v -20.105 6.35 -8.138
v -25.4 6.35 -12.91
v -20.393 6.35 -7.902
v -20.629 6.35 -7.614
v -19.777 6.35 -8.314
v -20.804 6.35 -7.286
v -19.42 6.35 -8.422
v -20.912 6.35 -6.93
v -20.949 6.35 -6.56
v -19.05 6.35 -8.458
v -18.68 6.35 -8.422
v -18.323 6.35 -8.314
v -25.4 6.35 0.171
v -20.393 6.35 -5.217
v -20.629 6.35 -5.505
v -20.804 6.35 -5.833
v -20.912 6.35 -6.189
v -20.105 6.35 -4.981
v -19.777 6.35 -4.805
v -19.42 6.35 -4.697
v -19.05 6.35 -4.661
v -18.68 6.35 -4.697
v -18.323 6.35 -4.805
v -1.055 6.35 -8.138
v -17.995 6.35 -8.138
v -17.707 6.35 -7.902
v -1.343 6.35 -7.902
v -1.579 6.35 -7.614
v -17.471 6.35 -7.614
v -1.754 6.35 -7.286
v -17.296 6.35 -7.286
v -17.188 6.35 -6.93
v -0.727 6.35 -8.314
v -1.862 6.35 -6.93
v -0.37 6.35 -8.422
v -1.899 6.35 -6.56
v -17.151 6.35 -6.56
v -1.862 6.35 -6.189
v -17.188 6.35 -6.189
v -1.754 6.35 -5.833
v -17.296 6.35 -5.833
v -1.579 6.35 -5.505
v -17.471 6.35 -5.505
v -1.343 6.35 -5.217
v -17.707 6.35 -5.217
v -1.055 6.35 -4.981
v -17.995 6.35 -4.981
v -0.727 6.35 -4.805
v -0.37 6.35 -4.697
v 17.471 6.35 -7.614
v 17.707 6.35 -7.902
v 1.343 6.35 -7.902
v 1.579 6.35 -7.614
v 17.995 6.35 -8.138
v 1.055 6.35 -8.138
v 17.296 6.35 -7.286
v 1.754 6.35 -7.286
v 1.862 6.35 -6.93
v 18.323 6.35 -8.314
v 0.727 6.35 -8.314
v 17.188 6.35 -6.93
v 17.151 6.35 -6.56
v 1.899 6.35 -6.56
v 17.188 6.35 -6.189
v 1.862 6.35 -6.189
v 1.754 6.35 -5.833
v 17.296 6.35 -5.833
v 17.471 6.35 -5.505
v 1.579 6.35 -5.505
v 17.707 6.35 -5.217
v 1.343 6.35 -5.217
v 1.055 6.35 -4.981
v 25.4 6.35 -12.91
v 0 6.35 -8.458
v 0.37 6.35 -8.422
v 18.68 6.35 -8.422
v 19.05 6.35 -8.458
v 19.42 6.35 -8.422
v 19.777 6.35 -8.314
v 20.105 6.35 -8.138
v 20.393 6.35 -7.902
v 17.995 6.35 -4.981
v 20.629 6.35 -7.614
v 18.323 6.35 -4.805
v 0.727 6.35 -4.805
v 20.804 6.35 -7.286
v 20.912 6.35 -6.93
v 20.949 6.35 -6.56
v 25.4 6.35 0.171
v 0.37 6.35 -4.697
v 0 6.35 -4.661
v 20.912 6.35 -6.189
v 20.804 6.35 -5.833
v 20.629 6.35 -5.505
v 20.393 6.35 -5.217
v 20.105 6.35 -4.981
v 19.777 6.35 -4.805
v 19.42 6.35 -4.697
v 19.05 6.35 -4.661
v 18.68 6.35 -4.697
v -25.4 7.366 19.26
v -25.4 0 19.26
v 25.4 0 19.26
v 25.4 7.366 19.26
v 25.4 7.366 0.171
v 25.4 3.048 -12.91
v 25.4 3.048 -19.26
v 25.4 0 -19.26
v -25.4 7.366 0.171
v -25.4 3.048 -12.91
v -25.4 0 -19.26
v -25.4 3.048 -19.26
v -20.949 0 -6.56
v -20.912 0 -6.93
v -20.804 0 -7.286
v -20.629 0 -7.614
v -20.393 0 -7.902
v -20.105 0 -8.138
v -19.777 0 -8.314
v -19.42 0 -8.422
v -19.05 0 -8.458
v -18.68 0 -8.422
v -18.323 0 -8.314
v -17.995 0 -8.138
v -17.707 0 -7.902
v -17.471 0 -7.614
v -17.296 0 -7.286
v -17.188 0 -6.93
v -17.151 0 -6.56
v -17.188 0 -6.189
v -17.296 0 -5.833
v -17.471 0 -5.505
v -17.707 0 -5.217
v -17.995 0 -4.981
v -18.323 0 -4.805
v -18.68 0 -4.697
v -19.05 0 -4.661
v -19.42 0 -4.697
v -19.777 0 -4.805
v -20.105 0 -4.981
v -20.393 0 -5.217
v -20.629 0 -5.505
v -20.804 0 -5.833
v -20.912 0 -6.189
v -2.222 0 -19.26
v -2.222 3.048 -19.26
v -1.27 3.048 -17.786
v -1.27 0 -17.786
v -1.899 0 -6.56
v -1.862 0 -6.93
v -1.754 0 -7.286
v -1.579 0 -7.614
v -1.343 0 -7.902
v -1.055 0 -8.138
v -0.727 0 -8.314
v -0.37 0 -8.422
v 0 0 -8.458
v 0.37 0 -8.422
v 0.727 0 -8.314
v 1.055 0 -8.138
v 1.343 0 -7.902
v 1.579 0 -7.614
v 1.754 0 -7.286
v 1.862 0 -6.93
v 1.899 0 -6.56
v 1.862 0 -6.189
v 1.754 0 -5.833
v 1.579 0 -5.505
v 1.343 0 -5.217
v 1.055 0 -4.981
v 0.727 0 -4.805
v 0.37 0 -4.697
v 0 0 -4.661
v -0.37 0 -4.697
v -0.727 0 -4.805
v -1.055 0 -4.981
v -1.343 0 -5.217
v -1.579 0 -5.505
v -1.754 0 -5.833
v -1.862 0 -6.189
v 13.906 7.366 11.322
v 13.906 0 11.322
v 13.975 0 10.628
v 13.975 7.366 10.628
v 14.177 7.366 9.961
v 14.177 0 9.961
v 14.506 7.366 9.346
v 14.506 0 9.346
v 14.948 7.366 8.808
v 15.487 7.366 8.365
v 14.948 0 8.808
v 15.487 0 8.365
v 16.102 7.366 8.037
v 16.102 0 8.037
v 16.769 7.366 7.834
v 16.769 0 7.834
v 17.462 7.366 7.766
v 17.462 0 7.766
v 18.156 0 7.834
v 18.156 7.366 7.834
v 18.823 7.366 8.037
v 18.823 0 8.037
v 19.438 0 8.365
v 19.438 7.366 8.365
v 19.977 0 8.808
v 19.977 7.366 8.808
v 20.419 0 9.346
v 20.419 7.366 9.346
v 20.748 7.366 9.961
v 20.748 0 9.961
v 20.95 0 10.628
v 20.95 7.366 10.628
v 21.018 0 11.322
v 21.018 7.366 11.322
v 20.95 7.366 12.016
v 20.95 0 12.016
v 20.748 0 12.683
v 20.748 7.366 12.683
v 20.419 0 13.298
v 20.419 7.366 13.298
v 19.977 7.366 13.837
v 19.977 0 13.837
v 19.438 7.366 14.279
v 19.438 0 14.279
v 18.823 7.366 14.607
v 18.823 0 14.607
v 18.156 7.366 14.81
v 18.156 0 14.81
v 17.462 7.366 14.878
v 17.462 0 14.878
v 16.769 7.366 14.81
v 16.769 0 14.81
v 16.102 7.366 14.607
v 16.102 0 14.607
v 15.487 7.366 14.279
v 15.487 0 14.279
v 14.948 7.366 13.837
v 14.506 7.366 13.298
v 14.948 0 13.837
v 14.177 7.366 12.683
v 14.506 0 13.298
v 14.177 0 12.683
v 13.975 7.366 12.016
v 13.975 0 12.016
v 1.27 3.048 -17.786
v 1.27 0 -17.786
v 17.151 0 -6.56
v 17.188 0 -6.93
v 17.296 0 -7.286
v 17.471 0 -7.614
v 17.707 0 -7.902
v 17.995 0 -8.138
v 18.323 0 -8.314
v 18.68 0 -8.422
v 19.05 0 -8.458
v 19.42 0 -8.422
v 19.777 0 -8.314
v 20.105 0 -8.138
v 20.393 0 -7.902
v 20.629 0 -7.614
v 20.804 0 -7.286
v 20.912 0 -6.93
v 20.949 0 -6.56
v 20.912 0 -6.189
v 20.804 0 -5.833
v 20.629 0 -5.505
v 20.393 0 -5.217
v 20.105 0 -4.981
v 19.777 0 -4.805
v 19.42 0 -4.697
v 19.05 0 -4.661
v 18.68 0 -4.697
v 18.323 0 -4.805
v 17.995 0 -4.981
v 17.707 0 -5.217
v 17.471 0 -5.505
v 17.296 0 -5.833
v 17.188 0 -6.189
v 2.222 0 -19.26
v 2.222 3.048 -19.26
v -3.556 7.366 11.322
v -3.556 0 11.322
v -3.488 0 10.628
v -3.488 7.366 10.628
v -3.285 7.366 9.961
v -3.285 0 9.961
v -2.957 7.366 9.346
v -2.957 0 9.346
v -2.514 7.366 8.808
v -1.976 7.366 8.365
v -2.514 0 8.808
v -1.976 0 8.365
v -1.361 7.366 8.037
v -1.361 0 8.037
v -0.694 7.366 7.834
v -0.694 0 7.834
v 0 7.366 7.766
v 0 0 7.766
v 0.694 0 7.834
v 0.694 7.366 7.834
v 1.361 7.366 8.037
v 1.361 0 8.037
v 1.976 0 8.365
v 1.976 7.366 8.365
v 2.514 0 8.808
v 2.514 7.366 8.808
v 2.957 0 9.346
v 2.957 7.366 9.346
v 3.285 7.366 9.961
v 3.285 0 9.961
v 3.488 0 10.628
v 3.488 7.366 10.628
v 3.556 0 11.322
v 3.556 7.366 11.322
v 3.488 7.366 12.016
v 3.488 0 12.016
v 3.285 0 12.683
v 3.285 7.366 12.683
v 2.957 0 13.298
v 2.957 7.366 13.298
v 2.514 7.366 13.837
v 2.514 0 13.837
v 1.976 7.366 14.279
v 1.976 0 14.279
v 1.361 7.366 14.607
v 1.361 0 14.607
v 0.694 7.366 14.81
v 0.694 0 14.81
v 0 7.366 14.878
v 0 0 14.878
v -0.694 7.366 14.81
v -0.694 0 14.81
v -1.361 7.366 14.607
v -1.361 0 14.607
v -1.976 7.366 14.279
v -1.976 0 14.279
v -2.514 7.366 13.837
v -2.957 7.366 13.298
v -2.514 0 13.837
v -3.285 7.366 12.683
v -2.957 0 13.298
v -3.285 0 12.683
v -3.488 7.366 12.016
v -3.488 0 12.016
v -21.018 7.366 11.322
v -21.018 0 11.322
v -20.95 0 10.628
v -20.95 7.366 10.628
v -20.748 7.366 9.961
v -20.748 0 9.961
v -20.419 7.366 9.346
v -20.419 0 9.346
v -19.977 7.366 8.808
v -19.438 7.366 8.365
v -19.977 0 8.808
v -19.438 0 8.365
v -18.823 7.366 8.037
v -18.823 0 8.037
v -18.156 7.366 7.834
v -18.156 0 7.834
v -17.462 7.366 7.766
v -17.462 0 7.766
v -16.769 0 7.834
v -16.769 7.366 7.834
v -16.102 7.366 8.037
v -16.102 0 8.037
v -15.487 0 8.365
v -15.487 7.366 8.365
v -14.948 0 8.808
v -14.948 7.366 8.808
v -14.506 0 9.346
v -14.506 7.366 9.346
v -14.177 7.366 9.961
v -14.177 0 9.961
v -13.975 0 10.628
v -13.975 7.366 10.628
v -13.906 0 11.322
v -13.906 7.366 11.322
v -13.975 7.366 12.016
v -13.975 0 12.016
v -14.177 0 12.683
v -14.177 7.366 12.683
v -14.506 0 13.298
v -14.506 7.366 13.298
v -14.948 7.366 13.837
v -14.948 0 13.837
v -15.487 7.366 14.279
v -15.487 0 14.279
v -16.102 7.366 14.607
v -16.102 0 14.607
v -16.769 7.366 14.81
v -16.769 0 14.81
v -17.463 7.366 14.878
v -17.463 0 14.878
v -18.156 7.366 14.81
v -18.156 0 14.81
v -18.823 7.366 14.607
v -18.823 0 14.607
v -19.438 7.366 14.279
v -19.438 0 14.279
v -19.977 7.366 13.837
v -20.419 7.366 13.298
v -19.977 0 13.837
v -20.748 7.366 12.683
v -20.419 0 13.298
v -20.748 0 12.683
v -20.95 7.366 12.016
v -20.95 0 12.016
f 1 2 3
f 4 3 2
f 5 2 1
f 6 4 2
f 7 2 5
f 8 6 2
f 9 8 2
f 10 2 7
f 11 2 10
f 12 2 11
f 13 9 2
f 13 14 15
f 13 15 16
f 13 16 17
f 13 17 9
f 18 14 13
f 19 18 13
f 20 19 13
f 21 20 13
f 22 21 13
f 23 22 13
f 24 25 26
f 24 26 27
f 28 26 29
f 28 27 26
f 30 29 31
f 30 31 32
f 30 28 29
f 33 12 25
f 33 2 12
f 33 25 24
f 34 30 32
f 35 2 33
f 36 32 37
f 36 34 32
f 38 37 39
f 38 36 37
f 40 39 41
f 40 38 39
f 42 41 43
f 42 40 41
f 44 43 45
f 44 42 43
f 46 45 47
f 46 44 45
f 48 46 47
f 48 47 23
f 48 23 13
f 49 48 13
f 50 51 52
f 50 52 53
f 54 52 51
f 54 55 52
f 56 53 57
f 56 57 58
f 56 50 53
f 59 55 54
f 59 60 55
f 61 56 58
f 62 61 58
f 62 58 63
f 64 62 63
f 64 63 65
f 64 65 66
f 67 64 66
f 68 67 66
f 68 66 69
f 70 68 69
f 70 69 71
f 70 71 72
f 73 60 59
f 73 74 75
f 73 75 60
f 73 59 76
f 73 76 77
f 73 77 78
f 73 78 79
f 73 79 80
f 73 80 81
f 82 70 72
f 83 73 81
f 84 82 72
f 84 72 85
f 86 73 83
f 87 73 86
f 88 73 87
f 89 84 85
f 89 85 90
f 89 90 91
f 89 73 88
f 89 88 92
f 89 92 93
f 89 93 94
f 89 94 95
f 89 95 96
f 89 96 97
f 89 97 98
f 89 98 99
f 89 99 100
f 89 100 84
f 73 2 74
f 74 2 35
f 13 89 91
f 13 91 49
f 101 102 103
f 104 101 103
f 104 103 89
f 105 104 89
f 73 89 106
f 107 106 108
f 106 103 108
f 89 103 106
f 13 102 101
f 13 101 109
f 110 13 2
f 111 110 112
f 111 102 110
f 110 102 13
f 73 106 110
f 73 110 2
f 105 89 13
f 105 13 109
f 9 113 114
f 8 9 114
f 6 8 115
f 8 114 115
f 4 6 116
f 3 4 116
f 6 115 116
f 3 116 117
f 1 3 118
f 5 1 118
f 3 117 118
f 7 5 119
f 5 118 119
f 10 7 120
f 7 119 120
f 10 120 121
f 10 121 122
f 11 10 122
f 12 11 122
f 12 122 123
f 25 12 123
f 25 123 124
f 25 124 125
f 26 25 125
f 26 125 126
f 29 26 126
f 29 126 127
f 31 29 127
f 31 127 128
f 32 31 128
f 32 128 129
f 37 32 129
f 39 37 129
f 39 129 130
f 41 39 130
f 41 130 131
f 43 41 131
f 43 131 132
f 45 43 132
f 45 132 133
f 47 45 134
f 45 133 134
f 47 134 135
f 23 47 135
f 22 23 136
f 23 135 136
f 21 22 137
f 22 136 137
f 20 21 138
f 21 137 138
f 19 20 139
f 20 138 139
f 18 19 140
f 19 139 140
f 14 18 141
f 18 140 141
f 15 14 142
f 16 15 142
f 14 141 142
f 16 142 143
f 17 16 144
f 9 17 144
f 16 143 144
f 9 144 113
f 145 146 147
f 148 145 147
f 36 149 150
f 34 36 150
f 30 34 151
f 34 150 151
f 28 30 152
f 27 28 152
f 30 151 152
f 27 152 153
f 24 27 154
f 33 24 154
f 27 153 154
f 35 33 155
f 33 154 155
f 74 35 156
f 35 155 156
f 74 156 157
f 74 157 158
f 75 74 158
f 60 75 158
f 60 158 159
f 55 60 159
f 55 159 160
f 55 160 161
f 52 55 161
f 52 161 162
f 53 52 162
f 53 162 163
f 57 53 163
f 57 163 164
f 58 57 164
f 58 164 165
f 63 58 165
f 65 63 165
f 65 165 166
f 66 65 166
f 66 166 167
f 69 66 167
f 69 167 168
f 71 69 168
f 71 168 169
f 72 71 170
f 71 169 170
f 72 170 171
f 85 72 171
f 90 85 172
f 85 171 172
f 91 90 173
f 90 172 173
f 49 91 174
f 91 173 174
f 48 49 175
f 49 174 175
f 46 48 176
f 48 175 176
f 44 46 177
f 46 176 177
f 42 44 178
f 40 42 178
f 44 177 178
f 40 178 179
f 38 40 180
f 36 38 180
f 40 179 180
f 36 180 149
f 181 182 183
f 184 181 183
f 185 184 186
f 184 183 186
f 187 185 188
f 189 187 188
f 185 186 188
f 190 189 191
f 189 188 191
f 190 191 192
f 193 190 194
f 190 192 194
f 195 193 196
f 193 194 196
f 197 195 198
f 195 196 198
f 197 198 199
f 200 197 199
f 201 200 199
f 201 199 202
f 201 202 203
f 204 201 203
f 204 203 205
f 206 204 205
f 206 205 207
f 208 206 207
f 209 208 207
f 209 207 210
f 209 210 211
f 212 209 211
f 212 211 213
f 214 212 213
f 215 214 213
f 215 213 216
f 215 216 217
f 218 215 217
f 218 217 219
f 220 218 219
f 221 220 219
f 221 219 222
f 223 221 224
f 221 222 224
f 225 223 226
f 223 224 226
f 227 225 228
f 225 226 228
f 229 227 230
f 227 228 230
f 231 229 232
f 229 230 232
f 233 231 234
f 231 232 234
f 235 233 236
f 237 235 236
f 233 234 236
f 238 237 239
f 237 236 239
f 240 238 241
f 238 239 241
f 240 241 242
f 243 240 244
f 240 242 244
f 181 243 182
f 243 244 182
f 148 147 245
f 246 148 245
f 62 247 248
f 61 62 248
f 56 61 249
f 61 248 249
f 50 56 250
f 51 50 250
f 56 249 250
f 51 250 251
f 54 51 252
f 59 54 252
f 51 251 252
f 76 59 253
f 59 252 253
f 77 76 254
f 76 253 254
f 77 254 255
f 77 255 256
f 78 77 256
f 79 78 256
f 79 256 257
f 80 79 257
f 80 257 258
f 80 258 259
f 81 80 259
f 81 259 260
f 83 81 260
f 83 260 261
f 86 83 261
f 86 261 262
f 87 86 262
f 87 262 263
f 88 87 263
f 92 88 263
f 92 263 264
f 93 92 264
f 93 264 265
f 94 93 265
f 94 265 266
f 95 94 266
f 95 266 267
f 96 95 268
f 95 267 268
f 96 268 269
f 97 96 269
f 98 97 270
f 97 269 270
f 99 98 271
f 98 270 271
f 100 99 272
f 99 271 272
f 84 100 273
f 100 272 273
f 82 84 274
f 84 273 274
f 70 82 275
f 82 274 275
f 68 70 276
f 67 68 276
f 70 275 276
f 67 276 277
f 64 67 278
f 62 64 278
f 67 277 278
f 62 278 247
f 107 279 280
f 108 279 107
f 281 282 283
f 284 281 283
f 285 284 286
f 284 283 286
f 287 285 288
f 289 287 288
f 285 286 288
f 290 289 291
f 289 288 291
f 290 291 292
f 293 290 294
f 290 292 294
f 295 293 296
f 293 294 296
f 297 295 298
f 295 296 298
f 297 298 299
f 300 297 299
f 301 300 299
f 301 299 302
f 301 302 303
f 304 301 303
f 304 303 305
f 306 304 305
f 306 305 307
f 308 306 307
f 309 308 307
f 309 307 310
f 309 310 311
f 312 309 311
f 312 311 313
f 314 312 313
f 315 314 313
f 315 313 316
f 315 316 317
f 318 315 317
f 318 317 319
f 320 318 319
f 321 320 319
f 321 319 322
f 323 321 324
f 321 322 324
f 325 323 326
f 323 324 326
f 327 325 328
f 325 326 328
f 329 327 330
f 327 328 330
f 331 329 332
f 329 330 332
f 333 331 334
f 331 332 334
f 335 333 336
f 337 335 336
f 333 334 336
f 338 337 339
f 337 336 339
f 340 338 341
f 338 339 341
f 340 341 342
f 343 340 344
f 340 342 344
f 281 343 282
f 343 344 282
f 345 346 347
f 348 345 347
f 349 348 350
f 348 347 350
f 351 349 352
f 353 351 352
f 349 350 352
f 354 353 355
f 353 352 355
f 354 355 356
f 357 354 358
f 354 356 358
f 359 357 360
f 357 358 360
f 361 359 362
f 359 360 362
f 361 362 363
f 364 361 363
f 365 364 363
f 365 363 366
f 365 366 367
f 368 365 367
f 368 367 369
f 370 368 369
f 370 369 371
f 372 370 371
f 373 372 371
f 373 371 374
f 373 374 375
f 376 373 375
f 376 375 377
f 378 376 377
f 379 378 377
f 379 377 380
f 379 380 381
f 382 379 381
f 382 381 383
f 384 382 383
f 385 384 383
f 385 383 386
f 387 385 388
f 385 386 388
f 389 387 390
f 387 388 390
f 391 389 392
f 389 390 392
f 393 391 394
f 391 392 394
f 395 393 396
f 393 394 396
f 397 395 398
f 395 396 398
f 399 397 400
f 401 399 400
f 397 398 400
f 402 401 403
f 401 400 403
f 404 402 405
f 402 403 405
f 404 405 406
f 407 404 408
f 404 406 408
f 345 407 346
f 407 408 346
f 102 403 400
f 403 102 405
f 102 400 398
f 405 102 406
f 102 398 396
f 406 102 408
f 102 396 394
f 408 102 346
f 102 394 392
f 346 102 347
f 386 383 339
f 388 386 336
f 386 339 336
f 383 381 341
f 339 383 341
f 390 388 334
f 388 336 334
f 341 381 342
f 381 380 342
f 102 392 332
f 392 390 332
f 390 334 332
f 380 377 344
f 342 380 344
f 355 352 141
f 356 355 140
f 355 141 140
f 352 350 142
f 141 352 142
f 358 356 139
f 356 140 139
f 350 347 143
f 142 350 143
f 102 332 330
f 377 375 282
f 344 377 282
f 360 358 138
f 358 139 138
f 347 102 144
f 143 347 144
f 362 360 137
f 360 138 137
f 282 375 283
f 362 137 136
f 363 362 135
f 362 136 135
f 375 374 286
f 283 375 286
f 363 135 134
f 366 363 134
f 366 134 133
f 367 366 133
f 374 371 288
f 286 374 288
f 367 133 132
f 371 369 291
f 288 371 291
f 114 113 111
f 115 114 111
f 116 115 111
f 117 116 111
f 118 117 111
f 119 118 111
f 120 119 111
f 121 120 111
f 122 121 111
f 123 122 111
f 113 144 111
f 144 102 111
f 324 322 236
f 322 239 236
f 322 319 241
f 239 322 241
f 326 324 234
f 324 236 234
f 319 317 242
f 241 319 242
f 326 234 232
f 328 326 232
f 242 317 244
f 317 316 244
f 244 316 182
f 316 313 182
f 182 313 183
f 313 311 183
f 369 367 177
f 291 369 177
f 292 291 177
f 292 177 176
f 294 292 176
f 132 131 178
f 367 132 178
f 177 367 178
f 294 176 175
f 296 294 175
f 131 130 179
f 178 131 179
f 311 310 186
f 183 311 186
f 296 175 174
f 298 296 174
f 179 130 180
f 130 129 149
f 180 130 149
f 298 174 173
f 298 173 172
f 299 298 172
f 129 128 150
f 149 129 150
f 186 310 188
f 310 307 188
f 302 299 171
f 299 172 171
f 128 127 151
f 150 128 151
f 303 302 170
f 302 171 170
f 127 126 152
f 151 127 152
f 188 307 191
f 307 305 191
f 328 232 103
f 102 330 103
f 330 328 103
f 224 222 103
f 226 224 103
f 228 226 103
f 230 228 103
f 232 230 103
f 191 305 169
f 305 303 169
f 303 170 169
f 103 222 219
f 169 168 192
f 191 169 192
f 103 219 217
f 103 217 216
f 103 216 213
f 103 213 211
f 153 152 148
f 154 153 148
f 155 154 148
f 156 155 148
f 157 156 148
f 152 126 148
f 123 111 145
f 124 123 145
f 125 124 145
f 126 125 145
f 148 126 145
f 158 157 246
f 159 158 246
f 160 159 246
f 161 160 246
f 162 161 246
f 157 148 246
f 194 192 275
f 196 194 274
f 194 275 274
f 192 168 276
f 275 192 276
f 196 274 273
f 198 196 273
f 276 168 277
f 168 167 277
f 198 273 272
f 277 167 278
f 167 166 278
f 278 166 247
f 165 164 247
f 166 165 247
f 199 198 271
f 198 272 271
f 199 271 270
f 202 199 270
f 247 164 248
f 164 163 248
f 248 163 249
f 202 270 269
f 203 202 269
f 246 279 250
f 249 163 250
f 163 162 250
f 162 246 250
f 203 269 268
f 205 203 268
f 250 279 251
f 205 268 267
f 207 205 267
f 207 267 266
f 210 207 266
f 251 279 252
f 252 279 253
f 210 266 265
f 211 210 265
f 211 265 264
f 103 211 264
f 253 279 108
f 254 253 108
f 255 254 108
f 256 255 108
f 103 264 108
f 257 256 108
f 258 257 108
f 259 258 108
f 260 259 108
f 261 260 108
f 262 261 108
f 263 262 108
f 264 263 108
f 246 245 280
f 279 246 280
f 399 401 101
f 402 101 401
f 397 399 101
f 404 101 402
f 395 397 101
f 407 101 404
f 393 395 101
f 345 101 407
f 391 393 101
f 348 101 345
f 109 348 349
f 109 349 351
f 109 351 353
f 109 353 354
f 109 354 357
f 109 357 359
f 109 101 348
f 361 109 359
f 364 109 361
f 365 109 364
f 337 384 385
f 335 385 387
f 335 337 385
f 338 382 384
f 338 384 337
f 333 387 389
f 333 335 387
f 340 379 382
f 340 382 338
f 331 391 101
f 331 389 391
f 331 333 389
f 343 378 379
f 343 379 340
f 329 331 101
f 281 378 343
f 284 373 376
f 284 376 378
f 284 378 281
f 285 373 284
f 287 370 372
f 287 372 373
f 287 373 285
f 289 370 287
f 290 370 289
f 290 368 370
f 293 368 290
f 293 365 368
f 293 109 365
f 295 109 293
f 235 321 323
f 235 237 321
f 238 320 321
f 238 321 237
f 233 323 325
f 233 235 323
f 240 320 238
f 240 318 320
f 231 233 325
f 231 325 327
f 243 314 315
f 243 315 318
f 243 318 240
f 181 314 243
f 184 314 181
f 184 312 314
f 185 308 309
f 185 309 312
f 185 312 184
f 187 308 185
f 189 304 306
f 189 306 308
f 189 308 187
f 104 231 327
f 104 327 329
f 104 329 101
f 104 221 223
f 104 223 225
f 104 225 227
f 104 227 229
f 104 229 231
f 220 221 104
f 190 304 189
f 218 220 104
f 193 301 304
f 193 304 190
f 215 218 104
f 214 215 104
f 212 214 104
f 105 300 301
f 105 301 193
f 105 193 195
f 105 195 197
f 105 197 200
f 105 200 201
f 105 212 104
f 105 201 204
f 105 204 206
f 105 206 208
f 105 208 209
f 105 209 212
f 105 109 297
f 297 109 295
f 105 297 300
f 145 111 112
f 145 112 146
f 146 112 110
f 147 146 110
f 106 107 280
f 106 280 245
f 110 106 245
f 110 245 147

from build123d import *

# Parameters (mm, degrees)
CROQUIS1_W                          = 50.8
CROQUIS1_H                          = 38.5191
SALIENTE_EXTRUIR1_DEPTH             = 7.366
CORTAR_EXTRUIR1_DEPTH               = 55.825434081
TALADROS_DE_ESPIGA_DE_5_16_0_28_1_D = 7.112
CORTAR_EXTRUIR2_DEPTH               = 33.167303123
TALADRO_ROSCADO_10_241_D            = 3.7973


with BuildPart() as part:
    # Croquis1 → Saliente-Extruir1 (new body)
    with BuildSketch(Plane(origin=(0, 0, 0), x_dir=(1, 0, 0), z_dir=(0, 1, 0))):
        Rectangle(CROQUIS1_W, CROQUIS1_H)
    extrude(amount=SALIENTE_EXTRUIR1_DEPTH)

    # Croquis2 → Cortar-Extruir1 (cut, through all)
    with BuildSketch(Plane(origin=(25.4, 0, 0), x_dir=(0, 0, -1), z_dir=(1, 0, 0))):
        Polygon((19.25955, 3.048), (12.90955, 3.048), (12.90955, 6.35), (-0.17145, 6.35), (-0.17145, 7.366), (19.25955, 7.366), align=None)
    extrude(amount=-CORTAR_EXTRUIR1_DEPTH, mode=Mode.SUBTRACT)

    # Taladros de espiga de 5/16 (0.28)1 (through all)
    with Locations(Plane(origin=(0, 7.366, 0), x_dir=(1, 0, 0), z_dir=(0, 1, 0))):
        with Locations((17.4625, -11.32205), (0, -11.32205), (-17.4625, -11.32205)):
            Hole(TALADROS_DE_ESPIGA_DE_5_16_0_28_1_D / 2)

    # Croquis5 → Cortar-Extruir2 (cut, through all)
    with BuildSketch(Plane(origin=(0, 3.048, 0), x_dir=(1, 0, 0), z_dir=(0, 1, 0))):
        Polygon((-2.2225, 19.25955), (-1.27, 17.78635), (1.27, 17.78635), (2.2225, 19.25955), align=None)
    extrude(amount=-CORTAR_EXTRUIR2_DEPTH, mode=Mode.SUBTRACT)

    # Taladro roscado #10-241 (through all)
    with Locations(Plane(origin=(0, 6.35, 0), x_dir=(1, 0, 0), z_dir=(0, 1, 0))):
        with Locations((19.05, 6.55955), (0, 6.55955), (-19.05, 6.55955)):
            Hole(TALADRO_ROSCADO_10_241_D / 2)


solid = part.part
